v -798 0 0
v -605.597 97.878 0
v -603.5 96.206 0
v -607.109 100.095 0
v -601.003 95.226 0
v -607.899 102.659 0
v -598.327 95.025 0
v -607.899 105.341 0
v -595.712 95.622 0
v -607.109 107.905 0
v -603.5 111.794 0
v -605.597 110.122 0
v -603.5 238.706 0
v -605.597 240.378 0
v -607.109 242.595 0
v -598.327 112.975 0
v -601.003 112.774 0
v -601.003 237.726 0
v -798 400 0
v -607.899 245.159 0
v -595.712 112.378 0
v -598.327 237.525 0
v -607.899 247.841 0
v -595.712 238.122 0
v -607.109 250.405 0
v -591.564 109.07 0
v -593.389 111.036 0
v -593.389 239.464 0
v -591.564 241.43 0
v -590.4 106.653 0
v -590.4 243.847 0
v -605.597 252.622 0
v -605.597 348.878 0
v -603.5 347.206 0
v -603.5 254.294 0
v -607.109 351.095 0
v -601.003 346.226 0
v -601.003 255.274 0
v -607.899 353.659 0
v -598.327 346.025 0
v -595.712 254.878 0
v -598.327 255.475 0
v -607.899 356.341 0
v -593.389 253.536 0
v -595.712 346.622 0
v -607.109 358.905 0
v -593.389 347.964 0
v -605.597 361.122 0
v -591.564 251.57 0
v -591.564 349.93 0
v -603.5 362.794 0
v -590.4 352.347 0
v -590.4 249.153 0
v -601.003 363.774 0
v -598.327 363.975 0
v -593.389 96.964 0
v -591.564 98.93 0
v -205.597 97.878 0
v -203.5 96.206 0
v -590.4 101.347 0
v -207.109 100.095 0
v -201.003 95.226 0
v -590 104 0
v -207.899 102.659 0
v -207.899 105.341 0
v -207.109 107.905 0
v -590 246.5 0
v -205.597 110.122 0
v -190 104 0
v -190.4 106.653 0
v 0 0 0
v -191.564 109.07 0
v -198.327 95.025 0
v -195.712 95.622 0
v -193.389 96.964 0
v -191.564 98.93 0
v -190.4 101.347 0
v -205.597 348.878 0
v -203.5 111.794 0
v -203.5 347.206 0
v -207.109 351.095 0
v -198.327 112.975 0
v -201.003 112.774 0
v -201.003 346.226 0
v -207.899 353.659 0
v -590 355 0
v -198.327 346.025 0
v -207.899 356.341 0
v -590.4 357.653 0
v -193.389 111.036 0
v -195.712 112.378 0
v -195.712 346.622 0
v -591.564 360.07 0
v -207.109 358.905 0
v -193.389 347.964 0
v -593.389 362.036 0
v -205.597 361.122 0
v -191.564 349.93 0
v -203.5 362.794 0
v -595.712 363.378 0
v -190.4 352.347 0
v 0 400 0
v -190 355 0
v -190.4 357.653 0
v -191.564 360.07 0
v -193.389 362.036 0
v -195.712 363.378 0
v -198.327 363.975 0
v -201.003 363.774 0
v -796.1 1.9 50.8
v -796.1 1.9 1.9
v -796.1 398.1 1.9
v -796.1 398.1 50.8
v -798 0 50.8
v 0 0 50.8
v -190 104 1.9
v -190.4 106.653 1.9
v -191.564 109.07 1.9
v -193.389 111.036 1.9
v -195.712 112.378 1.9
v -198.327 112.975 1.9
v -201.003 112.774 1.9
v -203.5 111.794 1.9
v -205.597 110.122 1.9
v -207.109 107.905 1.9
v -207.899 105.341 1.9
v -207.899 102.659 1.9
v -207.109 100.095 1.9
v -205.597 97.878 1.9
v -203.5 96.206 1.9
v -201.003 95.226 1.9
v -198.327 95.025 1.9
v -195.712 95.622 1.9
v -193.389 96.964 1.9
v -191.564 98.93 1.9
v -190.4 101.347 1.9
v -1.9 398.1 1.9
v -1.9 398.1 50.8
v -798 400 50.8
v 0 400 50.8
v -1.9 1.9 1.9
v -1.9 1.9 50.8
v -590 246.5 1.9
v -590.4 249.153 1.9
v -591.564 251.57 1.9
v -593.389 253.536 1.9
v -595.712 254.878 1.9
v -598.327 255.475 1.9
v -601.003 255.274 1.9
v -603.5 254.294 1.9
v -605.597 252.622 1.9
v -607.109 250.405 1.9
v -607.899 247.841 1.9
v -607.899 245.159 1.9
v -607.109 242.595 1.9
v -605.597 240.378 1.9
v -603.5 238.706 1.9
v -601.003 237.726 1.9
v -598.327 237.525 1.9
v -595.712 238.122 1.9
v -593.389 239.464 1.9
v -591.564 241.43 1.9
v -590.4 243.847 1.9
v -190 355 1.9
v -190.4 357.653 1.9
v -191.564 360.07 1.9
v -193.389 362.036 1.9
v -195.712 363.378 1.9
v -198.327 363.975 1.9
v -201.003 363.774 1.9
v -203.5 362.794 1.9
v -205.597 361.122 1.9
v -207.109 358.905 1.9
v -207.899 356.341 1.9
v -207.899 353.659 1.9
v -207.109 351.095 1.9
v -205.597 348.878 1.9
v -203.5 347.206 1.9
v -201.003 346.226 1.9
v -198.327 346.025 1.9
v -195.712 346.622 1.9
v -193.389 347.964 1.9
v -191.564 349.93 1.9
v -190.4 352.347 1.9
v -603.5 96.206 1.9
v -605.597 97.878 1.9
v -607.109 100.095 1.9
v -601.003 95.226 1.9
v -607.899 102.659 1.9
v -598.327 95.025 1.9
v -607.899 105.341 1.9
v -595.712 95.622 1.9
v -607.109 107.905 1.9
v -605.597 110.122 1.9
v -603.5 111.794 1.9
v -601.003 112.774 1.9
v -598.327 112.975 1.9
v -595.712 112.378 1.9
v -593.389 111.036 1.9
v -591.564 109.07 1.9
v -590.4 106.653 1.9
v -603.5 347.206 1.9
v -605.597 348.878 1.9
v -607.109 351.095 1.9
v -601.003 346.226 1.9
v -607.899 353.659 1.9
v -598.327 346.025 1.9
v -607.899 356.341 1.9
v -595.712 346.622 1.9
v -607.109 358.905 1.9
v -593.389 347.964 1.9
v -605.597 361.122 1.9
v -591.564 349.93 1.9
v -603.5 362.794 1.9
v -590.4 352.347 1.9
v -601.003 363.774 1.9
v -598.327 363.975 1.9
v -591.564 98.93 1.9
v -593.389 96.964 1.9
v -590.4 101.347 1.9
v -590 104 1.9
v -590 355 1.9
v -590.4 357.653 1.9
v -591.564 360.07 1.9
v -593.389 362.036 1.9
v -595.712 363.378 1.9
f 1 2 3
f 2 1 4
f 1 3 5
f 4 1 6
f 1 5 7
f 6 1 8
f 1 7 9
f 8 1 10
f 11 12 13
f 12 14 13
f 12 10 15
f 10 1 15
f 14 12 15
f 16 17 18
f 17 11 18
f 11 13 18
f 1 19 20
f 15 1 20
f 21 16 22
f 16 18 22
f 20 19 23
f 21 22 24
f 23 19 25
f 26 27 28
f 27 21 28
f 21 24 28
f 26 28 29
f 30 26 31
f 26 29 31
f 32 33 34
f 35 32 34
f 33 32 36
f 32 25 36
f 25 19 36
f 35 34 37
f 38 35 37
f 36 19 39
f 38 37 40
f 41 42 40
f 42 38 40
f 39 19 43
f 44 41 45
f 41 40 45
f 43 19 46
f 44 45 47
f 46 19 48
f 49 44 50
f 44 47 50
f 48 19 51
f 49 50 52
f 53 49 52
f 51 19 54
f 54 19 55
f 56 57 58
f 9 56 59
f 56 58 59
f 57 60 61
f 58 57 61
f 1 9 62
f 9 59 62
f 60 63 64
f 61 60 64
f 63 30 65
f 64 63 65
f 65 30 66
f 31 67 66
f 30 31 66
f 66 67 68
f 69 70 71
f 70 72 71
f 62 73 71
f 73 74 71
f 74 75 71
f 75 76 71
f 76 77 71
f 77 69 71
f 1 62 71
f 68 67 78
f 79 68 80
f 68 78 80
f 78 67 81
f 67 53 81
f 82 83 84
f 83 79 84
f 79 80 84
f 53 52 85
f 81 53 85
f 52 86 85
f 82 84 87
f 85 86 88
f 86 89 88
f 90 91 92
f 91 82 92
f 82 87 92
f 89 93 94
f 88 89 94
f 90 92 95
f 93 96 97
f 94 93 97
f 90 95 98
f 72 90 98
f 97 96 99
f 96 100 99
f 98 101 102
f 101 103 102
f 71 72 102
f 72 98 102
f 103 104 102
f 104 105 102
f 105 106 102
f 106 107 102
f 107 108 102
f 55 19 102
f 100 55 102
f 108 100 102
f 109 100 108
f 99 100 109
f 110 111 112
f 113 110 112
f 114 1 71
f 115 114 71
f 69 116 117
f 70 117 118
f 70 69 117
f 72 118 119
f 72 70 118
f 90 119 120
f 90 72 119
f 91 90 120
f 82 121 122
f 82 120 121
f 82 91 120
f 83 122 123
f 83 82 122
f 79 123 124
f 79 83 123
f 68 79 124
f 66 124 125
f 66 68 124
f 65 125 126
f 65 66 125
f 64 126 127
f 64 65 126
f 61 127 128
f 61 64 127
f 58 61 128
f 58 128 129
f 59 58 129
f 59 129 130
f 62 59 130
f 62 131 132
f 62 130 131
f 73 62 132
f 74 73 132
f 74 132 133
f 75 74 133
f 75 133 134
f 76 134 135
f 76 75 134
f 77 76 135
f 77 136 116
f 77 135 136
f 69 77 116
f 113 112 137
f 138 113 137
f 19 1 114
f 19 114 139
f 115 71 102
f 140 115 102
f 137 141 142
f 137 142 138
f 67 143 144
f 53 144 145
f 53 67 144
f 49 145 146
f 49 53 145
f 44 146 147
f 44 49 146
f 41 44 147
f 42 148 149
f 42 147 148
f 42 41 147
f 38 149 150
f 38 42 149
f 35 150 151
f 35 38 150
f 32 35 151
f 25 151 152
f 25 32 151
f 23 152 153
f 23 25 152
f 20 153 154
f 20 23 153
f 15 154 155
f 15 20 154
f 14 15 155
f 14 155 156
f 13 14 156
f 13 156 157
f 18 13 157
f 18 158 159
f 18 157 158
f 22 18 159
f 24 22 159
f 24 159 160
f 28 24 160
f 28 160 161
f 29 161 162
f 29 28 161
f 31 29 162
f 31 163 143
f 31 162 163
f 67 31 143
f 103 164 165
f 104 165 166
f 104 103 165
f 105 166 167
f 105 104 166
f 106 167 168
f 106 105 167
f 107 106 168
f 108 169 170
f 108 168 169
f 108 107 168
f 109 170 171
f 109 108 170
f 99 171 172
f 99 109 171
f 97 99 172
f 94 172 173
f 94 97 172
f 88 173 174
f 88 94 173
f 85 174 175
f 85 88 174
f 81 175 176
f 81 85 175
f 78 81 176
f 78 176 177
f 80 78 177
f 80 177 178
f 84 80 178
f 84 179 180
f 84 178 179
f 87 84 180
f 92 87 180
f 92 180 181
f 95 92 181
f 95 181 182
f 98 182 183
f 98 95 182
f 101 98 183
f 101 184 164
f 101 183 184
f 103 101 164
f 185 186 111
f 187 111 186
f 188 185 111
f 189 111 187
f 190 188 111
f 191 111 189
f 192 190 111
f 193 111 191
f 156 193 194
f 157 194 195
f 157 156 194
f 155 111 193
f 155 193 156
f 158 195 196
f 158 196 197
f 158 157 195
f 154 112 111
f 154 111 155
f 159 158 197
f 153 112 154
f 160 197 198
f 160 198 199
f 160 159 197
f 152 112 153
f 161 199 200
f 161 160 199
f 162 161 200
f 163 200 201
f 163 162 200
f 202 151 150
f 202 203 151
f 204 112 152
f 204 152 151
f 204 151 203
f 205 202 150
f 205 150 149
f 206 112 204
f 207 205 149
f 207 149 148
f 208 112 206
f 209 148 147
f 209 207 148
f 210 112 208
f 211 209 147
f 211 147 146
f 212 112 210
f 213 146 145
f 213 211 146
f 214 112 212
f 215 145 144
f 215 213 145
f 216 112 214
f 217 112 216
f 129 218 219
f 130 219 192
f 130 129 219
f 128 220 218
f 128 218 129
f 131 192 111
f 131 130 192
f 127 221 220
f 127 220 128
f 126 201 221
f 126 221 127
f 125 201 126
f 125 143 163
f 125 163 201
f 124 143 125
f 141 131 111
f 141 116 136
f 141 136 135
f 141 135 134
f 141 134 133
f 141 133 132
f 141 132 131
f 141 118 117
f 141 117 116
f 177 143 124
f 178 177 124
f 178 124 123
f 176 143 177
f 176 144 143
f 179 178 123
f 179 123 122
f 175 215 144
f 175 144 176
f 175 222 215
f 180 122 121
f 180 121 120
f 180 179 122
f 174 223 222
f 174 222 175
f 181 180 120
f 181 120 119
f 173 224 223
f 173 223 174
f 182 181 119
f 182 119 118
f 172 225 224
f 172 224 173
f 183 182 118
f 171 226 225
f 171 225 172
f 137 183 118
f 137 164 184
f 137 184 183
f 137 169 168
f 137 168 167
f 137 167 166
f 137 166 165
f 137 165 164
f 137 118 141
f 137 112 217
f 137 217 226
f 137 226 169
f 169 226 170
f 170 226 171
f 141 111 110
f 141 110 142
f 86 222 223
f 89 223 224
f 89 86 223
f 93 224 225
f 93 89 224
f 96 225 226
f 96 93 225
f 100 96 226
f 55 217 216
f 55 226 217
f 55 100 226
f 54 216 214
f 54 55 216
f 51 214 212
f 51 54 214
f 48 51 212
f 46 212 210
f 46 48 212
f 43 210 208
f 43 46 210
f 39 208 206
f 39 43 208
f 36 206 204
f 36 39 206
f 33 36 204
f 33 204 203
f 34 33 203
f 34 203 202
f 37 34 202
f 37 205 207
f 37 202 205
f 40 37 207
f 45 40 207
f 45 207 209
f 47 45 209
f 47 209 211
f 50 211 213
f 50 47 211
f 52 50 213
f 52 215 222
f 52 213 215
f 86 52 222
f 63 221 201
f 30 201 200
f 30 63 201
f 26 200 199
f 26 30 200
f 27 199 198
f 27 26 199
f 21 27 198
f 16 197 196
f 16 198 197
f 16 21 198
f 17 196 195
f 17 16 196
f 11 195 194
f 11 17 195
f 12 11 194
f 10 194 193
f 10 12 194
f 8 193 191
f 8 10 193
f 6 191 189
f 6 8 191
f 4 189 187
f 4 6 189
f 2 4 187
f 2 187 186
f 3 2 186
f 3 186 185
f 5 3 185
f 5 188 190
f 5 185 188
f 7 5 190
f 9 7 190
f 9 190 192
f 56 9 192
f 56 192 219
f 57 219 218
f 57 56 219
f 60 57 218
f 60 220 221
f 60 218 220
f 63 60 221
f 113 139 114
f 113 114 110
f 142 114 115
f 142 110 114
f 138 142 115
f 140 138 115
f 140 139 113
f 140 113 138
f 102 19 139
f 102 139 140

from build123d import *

# Parameters (mm, degrees)
CROQUIS1_W              = 798
CROQUIS1_H              = 400
CROQUIS1_R              = 9
SALIENTE_EXTRUIR1_DEPTH = 50.8
VACIADO1_T              = -1.9
CROQUIS2_W              = 794.2
CROQUIS2_H              = 396.2
CORTAR_EXTRUIR1_DEPTH   = 48.9


with BuildPart() as part:
    # Croquis1 → Saliente-Extruir1 (new body)
    with BuildSketch(Plane.XY):
        with Locations((-399, 200)):
            Rectangle(CROQUIS1_W, CROQUIS1_H)
        with Locations((-599, 355)):
            Circle(CROQUIS1_R, mode=Mode.SUBTRACT)
        with Locations((-599, 246.5)):
            Circle(CROQUIS1_R, mode=Mode.SUBTRACT)
        with Locations((-599, 104)):
            Circle(CROQUIS1_R, mode=Mode.SUBTRACT)
        with Locations((-199, 104)):
            Circle(CROQUIS1_R, mode=Mode.SUBTRACT)
        with Locations((-199, 355)):
            Circle(CROQUIS1_R, mode=Mode.SUBTRACT)
    extrude(amount=SALIENTE_EXTRUIR1_DEPTH)

    # Vaciado1
    vaciado1_openings = [part.faces().sort_by_distance(p)[0] for p in [
        (-398.839920182, 199.86833435, 50.8),
    ]]
    offset(amount=VACIADO1_T, openings=vaciado1_openings, kind=Kind.INTERSECTION)

    # Croquis2 → Cortar-Extruir1 (cut)
    with BuildSketch(Plane.XY.offset(50.8)):
        with Locations((-399, 200)):
            Rectangle(CROQUIS2_W, CROQUIS2_H)
    extrude(amount=-CORTAR_EXTRUIR1_DEPTH, mode=Mode.SUBTRACT)


solid = part.part
